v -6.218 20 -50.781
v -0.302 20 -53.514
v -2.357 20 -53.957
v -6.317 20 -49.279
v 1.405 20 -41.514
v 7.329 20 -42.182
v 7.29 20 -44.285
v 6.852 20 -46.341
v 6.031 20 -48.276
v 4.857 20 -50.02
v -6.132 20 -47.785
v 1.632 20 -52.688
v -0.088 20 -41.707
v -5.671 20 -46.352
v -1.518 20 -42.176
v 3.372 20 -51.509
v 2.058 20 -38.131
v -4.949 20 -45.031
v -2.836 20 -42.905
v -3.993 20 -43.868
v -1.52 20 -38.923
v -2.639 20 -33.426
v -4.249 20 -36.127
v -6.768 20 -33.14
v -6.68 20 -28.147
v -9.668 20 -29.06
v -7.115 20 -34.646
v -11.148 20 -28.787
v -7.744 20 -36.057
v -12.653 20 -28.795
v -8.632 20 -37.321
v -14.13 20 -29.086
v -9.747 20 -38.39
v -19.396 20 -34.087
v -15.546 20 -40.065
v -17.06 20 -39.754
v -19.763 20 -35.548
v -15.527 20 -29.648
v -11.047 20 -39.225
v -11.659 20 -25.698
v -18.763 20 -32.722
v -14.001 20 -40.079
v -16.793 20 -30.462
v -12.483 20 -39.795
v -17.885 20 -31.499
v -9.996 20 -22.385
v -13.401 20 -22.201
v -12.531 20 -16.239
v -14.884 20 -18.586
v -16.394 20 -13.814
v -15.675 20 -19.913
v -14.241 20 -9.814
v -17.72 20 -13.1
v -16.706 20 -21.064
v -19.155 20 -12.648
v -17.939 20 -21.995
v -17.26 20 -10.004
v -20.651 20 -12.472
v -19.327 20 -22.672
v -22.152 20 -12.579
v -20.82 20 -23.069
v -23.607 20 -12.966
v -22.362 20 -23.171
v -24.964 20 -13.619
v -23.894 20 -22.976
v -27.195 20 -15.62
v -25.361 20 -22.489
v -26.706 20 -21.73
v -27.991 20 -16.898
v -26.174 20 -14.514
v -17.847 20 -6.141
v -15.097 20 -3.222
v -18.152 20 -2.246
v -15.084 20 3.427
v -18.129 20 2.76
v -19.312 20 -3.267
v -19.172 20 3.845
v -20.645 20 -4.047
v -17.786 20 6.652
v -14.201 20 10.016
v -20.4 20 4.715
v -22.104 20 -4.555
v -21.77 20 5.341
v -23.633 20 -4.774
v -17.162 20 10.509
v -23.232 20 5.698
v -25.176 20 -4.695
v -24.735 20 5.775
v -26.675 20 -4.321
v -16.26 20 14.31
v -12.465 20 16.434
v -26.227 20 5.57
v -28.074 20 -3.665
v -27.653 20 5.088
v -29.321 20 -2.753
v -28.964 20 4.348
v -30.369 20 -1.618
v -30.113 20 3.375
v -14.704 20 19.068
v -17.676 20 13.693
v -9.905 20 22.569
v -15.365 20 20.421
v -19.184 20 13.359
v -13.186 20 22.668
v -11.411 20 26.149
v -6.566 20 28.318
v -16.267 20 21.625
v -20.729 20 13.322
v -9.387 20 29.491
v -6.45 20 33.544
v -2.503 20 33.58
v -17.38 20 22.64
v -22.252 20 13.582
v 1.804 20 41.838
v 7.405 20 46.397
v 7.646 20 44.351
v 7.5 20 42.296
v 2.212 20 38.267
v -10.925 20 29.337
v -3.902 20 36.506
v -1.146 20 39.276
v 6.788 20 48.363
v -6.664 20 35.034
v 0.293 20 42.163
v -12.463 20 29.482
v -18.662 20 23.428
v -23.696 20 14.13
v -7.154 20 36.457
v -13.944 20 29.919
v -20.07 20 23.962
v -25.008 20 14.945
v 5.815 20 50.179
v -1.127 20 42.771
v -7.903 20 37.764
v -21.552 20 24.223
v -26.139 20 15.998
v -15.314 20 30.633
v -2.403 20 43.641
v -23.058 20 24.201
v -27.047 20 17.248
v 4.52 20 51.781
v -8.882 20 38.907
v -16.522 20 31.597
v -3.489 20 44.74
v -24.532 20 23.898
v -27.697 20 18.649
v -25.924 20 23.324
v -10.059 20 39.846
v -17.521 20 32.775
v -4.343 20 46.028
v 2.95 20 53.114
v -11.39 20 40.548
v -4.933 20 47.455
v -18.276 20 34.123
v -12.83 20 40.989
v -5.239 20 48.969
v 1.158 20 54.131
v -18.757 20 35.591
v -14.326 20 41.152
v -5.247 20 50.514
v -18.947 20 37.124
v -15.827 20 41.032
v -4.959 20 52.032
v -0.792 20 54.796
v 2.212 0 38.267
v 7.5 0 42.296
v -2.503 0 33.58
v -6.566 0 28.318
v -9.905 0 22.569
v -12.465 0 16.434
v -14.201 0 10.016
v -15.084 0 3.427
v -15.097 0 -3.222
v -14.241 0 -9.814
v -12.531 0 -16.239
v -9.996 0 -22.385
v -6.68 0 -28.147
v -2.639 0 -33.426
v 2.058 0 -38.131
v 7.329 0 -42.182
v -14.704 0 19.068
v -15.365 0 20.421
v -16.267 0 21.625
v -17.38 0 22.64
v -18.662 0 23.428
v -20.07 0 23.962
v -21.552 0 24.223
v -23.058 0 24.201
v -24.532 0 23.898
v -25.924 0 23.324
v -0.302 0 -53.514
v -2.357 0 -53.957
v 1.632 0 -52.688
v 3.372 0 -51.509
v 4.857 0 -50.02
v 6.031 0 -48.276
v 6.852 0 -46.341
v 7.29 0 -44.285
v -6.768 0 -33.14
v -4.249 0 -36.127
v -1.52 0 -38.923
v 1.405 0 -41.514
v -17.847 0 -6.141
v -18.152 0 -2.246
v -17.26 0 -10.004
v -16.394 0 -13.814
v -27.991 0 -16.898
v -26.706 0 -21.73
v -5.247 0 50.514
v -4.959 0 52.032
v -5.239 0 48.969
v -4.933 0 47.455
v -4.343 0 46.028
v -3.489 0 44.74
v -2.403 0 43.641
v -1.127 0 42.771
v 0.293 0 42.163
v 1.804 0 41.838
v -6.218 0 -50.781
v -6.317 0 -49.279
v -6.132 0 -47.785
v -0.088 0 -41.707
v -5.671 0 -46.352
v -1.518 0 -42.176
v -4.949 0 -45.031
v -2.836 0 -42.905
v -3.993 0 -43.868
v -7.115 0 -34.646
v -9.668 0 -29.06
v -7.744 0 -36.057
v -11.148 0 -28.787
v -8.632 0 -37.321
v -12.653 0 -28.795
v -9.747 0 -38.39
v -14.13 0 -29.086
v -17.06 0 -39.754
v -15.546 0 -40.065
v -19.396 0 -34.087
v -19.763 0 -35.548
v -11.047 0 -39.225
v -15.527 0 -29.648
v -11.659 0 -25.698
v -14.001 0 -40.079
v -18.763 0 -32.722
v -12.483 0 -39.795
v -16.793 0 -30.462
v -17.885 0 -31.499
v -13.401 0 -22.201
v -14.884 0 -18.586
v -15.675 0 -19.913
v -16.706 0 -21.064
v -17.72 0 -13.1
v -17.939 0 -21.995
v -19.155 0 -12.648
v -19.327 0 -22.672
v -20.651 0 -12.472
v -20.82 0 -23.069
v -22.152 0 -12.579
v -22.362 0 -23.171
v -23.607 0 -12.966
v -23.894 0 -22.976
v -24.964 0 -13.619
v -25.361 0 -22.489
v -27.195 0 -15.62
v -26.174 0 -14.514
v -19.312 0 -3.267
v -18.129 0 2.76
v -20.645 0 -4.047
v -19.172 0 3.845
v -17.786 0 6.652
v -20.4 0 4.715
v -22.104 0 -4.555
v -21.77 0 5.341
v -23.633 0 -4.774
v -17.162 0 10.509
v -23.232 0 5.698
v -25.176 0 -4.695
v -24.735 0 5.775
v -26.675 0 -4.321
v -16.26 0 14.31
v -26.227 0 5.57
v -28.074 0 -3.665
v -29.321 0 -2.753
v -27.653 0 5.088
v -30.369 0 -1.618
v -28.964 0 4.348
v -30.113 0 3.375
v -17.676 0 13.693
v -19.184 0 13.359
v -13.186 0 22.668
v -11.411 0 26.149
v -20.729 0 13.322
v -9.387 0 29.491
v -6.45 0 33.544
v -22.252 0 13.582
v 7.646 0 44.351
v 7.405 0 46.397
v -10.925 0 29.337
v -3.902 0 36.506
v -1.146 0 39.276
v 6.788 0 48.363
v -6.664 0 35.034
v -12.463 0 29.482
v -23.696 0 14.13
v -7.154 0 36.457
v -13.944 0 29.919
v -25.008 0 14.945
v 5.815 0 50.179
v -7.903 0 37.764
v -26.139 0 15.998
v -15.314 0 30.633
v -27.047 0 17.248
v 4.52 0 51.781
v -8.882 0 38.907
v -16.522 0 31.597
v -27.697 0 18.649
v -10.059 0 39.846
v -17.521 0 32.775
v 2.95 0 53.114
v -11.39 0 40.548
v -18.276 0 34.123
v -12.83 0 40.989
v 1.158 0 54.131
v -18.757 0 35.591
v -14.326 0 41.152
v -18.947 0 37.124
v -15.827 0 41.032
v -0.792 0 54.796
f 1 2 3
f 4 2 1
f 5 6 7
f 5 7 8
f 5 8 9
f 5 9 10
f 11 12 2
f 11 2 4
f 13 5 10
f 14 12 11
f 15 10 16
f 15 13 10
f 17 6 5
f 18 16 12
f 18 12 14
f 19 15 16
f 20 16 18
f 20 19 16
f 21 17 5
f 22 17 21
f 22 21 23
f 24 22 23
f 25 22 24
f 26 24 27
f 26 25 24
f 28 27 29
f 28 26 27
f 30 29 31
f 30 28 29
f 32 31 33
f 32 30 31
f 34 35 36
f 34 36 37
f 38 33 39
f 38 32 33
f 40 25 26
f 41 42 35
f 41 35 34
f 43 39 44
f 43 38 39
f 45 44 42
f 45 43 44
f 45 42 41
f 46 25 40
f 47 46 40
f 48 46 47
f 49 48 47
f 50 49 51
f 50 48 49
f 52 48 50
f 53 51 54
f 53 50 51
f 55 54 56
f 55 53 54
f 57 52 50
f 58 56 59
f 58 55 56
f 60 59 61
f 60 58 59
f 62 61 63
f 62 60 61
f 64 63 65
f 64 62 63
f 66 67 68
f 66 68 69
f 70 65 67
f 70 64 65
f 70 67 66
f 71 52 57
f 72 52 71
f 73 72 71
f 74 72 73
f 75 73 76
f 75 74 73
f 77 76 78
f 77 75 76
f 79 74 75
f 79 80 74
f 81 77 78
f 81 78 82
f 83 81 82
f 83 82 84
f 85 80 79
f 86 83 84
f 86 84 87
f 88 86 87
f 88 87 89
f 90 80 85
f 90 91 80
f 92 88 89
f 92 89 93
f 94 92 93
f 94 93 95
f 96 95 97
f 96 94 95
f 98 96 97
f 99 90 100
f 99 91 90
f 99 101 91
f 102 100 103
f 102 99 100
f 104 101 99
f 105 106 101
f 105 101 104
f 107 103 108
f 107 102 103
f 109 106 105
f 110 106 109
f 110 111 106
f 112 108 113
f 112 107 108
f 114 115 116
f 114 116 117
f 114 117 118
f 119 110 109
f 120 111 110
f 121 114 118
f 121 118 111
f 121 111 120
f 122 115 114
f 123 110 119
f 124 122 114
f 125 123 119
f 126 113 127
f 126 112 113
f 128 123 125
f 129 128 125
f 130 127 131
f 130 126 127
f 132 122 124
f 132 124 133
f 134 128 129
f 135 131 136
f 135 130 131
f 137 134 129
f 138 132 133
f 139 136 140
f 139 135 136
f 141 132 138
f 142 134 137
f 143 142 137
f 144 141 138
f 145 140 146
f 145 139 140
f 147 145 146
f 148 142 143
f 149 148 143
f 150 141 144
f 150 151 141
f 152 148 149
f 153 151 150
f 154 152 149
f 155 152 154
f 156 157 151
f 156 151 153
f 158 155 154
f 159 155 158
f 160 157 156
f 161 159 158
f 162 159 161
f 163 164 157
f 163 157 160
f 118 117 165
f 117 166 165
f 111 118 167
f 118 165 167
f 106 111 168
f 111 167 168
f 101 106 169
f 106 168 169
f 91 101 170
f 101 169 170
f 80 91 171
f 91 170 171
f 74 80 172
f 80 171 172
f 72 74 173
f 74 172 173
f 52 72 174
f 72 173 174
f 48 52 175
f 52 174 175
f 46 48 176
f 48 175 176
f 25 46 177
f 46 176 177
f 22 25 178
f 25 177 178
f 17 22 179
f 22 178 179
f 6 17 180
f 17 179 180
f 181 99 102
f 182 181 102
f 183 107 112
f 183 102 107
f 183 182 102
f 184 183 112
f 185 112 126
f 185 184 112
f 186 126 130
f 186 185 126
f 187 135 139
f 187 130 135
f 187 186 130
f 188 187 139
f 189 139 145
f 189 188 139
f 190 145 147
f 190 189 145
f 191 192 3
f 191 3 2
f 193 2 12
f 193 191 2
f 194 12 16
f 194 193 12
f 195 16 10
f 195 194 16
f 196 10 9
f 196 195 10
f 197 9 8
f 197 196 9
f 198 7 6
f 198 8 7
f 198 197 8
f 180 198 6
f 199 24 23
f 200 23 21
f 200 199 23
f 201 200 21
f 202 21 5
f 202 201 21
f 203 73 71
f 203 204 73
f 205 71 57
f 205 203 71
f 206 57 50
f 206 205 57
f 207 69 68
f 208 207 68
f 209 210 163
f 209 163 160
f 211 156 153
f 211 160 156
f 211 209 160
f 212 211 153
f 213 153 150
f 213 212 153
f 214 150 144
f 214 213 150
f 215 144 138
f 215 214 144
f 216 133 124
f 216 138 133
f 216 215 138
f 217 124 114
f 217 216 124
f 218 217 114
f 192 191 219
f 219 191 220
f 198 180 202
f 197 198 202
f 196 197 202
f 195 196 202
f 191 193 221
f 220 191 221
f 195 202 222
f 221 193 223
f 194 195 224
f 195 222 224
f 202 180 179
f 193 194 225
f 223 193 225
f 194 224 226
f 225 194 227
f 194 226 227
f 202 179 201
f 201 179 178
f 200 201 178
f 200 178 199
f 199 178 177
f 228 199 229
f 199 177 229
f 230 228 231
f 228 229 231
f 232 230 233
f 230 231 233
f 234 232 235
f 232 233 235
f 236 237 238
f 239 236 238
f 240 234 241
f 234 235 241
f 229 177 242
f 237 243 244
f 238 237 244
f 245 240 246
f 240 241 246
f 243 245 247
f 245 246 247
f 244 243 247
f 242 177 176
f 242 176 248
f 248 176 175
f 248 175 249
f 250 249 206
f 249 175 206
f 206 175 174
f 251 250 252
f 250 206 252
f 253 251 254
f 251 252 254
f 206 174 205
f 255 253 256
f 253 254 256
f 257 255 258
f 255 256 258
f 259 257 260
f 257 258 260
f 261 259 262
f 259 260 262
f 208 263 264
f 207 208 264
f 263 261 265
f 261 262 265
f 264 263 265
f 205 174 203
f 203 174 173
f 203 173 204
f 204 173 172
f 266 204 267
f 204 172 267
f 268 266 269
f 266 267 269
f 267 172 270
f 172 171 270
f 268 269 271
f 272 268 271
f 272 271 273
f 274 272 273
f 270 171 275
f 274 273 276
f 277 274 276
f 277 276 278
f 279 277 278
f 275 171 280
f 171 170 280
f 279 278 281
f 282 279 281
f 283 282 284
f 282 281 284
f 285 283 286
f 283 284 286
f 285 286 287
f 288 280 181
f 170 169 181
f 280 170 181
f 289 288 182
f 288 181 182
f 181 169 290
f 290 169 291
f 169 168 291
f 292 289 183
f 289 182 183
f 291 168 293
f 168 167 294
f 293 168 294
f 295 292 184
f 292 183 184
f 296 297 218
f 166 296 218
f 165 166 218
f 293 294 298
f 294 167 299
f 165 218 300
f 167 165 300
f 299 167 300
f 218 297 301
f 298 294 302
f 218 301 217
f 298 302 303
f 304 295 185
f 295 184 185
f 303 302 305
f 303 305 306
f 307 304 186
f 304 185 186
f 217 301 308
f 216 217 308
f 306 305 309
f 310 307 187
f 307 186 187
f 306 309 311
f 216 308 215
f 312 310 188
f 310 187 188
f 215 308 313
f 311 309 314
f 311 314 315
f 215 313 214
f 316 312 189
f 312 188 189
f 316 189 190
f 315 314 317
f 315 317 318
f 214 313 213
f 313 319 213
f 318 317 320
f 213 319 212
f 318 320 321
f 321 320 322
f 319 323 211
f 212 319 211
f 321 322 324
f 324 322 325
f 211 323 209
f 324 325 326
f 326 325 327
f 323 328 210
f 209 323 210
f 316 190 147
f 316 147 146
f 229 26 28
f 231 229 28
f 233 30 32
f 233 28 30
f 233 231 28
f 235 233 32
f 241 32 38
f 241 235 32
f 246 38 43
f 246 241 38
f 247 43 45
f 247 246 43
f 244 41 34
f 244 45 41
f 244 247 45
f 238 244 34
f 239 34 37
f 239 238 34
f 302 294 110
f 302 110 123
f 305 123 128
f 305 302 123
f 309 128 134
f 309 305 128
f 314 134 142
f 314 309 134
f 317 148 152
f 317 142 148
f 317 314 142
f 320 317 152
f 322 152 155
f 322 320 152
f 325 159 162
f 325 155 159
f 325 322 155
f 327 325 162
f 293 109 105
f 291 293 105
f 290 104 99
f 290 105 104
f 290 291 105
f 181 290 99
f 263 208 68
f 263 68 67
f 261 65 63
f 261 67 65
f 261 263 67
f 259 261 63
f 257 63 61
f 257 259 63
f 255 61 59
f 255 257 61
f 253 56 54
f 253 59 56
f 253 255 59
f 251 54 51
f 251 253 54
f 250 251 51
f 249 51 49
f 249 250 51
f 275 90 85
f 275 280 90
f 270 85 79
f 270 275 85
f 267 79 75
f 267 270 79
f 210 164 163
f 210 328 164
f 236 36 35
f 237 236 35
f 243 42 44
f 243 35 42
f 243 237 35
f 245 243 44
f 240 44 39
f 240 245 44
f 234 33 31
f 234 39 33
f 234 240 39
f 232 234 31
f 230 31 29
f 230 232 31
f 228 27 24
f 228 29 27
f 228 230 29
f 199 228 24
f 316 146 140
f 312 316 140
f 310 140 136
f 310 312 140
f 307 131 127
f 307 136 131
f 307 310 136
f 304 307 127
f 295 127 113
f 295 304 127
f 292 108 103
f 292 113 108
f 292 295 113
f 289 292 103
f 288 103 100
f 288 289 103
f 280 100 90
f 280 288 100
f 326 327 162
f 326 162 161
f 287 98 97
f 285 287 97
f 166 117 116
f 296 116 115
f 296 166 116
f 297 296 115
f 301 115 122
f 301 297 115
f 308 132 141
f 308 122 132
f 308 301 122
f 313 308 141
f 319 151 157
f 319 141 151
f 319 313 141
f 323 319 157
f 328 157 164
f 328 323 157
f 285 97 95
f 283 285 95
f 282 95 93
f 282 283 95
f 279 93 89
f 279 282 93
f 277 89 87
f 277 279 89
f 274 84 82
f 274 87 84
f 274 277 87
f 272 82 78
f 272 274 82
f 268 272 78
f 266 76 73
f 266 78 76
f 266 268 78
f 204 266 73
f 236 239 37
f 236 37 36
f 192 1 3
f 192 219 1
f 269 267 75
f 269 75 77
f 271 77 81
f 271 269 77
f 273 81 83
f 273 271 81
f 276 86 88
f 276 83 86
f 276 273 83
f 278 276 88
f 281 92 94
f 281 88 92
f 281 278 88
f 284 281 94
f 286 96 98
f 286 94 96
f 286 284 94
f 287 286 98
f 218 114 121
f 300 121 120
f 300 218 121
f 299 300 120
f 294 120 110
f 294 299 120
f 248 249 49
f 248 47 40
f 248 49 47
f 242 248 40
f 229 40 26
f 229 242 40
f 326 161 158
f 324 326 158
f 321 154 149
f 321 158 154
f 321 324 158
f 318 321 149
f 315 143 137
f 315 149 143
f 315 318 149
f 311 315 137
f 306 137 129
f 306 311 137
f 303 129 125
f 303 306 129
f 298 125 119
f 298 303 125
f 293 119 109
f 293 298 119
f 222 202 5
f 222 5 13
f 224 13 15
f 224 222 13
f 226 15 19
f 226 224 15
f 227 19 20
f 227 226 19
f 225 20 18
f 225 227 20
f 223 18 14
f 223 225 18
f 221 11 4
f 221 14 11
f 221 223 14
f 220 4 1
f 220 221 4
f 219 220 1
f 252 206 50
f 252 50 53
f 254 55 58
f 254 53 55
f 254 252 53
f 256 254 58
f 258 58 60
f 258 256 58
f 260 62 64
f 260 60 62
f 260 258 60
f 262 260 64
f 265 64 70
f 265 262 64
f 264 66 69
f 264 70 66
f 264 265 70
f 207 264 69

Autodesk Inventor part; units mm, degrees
ref_plane "YZ Plane" through (0, 0, 0) normal (1, 0, 0) x (0, 1, 0)
ref_plane "XZ Plane" through (0, 0, 0) normal (0, 1, 0) x (-1, 0, 0)
ref_plane "XY Plane" through (0, 0, 0) normal (0, 0, 1) x (1, 0, 0)
sketch "Sketch1" plane through (0, 0, 0) normal (0, 1, 0) x (-1, 0, 0)
  line L0 (-34.333, 34.6818) -> (-49.333, 34.6818) construction
  line L1 (-34.333, -45.5191) -> (-34.333, 34.6818) construction
  line L2 (-34.333, 34.6818) -> (-49.333, -49.911) construction
  line L3 (-34.333, 34.6818) -> (-34.333, 29.6818) construction
  line L4 (-34.333, 19.6818) -> (-46.333, 19.6818) construction
  line L5 (-46.333, 19.6818) -> (-46.333, 29.6818) construction
  line L6 (-46.333, 29.6818) -> (-34.333, 29.6818) construction
  line L7 (-34.333, 3.6818) -> (-46.333, 3.6818) construction
  line L8 (-46.333, 3.6818) -> (-46.333, 13.6818) construction
  line L9 (-46.333, 13.6818) -> (-34.333, 13.6818) construction
  line L10 (-34.333, -12.3182) -> (-46.333, -12.3182) construction
  line L11 (-46.333, -12.3182) -> (-46.333, -2.3182) construction
  line L12 (-46.333, -2.3182) -> (-34.333, -2.3182) construction
  line L13 (-34.333, -28.3182) -> (-46.333, -28.3182) construction
  line L14 (-46.333, -28.3182) -> (-46.333, -18.3182) construction
  line L15 (-46.333, -18.3182) -> (-34.333, -18.3182) construction
  line L16 (-34.333, -44.3182) -> (-46.333, -44.3182) construction
  line L17 (-46.333, -44.3182) -> (-46.333, -34.3182) construction
  line L18 (-46.333, -34.3182) -> (-34.333, -34.3182) construction
  line L19 (-34.333, -60.3182) -> (-46.333, -60.3182) construction
  line L20 (-46.333, -60.3182) -> (-46.333, -50.3182) construction
  line L21 (-46.333, -50.3182) -> (-34.333, -50.3182) construction
  line L22 (-34.333, 19.6818) -> (-34.333, 13.6818) construction
  line L23 (-34.333, 3.6818) -> (-34.333, -2.3182) construction
  line L24 (-34.333, -12.3182) -> (-34.333, -18.3182) construction
  line L25 (-34.333, -28.3182) -> (-34.333, -34.3182) construction
  arc A0 (-7.5, -42.2964) -> (-7.5, 42.2964) centre (-35.5563, 0) ccw
  line L26 (-49.333, 34.6818) -> (-49.333, -65.3182) construction
  line L27 (-49.333, -65.3182) -> (-34.333, -65.3182) construction
  line L28 (-34.333, -65.3182) -> (-34.333, -60.3182) construction
  line L29 (0.7921, 54.796) -> (-7.5, 42.2964)
  line L30 (0.7921, 54.796) -> (4.9587, 52.032)
  line L31 (-1.8037, 41.8383) -> (4.9587, 52.032)
  line L32 (9.3874, 29.4913) -> (18.9468, 37.1243)
  line L33 (15.8269, 41.0315) -> (18.9468, 37.1243)
  line L34 (15.8269, 41.0315) -> (4.1052, 31.6719)
  line L35 (16.2597, 14.3103) -> (27.6972, 18.649)
  line L36 (25.9239, 23.3239) -> (27.6972, 18.649)
  line L37 (25.9239, 23.3239) -> (11.899, 18.0039)
  line L38 (18.1525, -2.2458) -> (30.3692, -1.6184)
  line L39 (30.1128, 3.375) -> (30.3692, -1.6184)
  line L40 (30.1128, 3.375) -> (15.1325, 2.6057)
  line L41 (14.8841, -18.5862) -> (26.706, -21.7303)
  line L42 (27.9911, -16.8982) -> (26.706, -21.7303)
  line L43 (27.9911, -16.8982) -> (13.495, -13.0429)
  line L44 (6.7685, -33.1405) -> (17.0595, -39.7539)
  line L45 (19.7626, -35.5476) -> (17.0595, -39.7539)
  line L46 (19.7626, -35.5476) -> (7.1437, -27.4381)
  line L47 (-5.4144, -44.51) -> (2.3568, -53.9573)
  line L48 (6.2182, -50.781) -> (2.3568, -53.9573)
  line L49 (6.2182, -50.781) -> (-3.3108, -39.1966)
  arc A1 (-5.4144, -44.51) -> (-5.8417, 44.7964) centre (-35.5563, 0) ccw
  line L50 (2.3568, -53.9573) -> (-7.329, -42.1825)
  arc A2 (0.7921, 54.796) -> (-7.5, 42.2964) centre (3.3515, 44.0979) ccw
  arc A3 (15.8269, 41.0315) -> (6.4495, 33.5438) centre (14.44, 33.1526) ccw
  arc A4 (9.3874, 29.4913) -> (18.9468, 37.1243) centre (10.9496, 37.3373) ccw
  arc A5 (25.9239, 23.3239) -> (14.704, 19.0679) centre (22.1907, 16.2484) ccw
  arc A6 (16.2597, 14.3103) -> (27.6972, 18.649) centre (20.1496, 21.301) ccw
  arc A7 (30.1128, 3.375) -> (18.1286, 2.7595) centre (24.3921, -2.2173) ccw
  arc A8 (18.1525, -2.2458) -> (30.3692, -1.6184) centre (23.9964, 3.2176) ccw
  arc A9 (27.9911, -16.8982) -> (16.3942, -13.814) centre (20.8326, -20.4699) ccw
  arc A10 (14.8841, -18.5862) -> (26.706, -21.7303) centre (22.1204, -15.1749) ccw
  arc A11 (19.7626, -35.5476) -> (9.6675, -29.06) centre (11.8543, -36.7553) ccw
  arc A12 (6.7685, -33.1405) -> (17.0595, -39.7539) centre (14.7018, -32.1092) ccw
  arc A13 (6.2182, -50.781) -> (-1.405, -41.5135) centre (-1.68, -49.5088) ccw
  arc A14 (-7.329, -42.1825) -> (2.3568, -53.9573) centre (3.6382, -43.0322) ccw
  arc A15 (-1.8037, 41.8383) -> (4.9587, 52.032) centre (-2.7195, 49.7857) ccw
  point P0 (0, 0)
  point P1 (-34.333, -5.4186)
  point P2 (-1.405, -41.5135)
  point P3 (9.6675, -29.06)
  point P4 (16.3942, -13.814)
  point P5 (18.1286, 2.7595)
  point P6 (14.704, 19.0679)
  point P7 (6.4495, 33.5438)
  point P8 (-7.5, 42.2964)
  dimension "d4" = 5
  dimension "d5" = 10
  dimension "d6" = 12
  dimension "d9" = 16
  dimension "d14" = 10
  dimension "d19" = 100
  dimension "d20" = 3
  dimension "d25" = 5
  dimension "d28" = 107
  dimension "d30" = 17.833
  dimension "d31" = 50.7557
  dimension "d32" = 11
  dimension "d34" = 8
  dimension "d35" = 8
  dimension "d36" = 8
  dimension "d37" = 8
  dimension "d38" = 8
  dimension "d39" = 8
  dimension "d40" = 8
  dimension "d41" = 8
  dimension "d42" = 8
  dimension "d43" = 8
  dimension "d44" = 8
  dimension "d46" = 11
  dimension "d47" = 8
extrude "Extrusion1" add sketch "Sketch1" along normal blind 20
properties part number "pneunet_approximate_test_first_bend_INFLATED"
